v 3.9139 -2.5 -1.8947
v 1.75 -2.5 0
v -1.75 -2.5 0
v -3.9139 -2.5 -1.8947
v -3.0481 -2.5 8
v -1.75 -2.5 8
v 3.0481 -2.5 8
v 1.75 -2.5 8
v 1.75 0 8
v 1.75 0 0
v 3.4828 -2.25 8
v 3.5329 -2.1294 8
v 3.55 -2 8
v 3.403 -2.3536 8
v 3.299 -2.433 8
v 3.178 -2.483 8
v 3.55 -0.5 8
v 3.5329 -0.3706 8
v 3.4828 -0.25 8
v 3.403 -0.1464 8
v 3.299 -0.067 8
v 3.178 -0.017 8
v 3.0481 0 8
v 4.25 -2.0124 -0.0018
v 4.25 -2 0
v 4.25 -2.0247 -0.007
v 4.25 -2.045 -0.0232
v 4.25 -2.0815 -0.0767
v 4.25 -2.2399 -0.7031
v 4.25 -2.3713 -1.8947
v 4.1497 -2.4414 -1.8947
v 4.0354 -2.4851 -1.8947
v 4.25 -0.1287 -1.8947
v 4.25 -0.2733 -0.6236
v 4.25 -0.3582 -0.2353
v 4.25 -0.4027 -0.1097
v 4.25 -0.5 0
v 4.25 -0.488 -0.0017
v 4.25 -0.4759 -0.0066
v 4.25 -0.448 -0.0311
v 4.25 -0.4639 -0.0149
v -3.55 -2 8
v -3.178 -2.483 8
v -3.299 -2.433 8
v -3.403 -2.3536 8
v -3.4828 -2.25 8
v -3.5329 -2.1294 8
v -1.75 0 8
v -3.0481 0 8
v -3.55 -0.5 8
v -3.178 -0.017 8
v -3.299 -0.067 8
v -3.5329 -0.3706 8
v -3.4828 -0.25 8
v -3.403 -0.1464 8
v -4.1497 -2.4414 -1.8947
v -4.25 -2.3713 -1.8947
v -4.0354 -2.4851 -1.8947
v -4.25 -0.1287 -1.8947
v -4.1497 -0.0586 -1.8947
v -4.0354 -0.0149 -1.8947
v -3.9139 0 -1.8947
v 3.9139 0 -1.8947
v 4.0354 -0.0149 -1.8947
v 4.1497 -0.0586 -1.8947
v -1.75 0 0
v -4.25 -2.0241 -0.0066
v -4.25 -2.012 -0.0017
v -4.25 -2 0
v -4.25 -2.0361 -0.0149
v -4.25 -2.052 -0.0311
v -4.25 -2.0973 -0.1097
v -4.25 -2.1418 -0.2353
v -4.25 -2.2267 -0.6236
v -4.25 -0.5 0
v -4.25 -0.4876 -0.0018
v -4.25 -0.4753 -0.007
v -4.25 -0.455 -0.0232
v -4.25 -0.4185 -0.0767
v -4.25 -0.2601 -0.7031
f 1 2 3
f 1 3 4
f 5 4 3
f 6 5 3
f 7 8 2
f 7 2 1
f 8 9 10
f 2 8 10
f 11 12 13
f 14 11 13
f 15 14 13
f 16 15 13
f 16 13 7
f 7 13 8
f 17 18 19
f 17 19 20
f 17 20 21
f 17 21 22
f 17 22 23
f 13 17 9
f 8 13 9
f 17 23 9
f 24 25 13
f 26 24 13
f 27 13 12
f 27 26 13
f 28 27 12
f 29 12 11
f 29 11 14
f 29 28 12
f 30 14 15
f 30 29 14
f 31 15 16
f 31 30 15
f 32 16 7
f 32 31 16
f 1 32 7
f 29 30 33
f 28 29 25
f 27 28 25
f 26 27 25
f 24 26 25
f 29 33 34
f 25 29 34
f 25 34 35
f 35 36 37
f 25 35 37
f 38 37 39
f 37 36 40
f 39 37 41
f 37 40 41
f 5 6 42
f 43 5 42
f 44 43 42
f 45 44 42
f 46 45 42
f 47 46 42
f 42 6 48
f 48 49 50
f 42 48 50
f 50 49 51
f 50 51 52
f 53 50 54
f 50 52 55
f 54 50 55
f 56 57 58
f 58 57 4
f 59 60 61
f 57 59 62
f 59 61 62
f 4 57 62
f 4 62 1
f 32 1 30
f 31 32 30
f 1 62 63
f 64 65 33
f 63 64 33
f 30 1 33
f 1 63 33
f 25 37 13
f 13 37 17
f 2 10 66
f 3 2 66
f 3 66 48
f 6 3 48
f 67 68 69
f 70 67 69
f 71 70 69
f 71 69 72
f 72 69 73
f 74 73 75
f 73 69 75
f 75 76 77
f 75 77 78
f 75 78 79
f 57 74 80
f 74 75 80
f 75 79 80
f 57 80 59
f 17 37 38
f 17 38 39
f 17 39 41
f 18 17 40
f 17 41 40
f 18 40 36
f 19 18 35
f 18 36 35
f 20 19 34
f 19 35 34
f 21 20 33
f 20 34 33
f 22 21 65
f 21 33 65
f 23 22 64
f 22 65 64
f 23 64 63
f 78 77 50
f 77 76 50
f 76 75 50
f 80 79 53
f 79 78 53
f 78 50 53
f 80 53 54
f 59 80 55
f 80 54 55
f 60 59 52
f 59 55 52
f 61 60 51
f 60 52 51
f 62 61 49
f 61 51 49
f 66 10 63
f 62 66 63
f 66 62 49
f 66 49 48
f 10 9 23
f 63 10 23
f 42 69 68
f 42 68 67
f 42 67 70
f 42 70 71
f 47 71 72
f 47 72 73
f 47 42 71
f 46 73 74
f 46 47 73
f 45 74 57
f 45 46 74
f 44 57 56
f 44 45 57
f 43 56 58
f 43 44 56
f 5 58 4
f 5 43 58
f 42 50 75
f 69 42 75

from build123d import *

# Parameters (mm, degrees)
F1_DEPTH    = 2.5
F2_T1_DEPTH = 15.5305666052
F2_T3_DEPTH = 15.5305666052


# Not quite as in the source:
# - a fillet or chamfer that OpenCascade refuses, or shapes differently, is made with other operations: its cross-section is extruded or revolved along the edge and cut away or added


with BuildPart() as f1:
    # F0 (on Front) → F1 (new body)
    with BuildSketch(Plane.XZ):
        Polygon((0, -1.894692351), (0, 0), (-1.75, 0), (-4.25, 0), (-4.25, -1.894692351), align=None)
        Polygon((1.75, 0), (0, 0), (0, -1.894692351), (4.25, -1.894692351), (4.25, 0), align=None)
        Polygon((-4.25, 0), (-1.75, 0), (-1.75, 8), (-3.55, 8), align=None)
        Polygon((1.75, 8), (1.75, 0), (4.25, 0), (3.55, 8), align=None)
    extrude(amount=F1_DEPTH)

    # F2: fillet of radius 0.5 on 4 edges, made by hand

    # F2_s2 → F2_t1 (cut)
    with BuildSketch(Plane(origin=(0.5770852674, 0, -6.5952601994), x_dir=(0, 1, 0), z_dir=(-0.0871669503, 0, 0.9961937175))):
        with BuildLine():
            ThreePointArc((-2, -4.2338232994), (-2.3535533906, -4.08737669), (-2.5, -3.7338232994))
            Line((-2.5, -3.7338232994), (-2.5, -4.2338232994))
            Line((-2.5, -4.2338232994), (-2, -4.2338232994))
        make_face()
        with BuildLine():
            ThreePointArc((-0.5, -4.2338232994), (-0.1464466094, -4.08737669), (0, -3.7338232994))
            Line((0, -3.7338232994), (0, -4.2338232994))
            Line((0, -4.2338232994), (-0.5, -4.2338232994))
        make_face()
    extrude(amount=F2_T1_DEPTH, mode=Mode.SUBTRACT)

    # F2_s4 → F2_t3 (cut)
    with BuildSketch(Plane(origin=(0.7766668597, 0, 8.8761926818), x_dir=(0, 1, 0), z_dir=(-0.0871669503, 0, -0.9961937175))):
        with BuildLine():
            ThreePointArc((-2, -4.2338232994), (-2.3535533906, -4.08737669), (-2.5, -3.7338232994))
            Line((-2.5, -3.7338232994), (-2.5, -4.2338232994))
            Line((-2.5, -4.2338232994), (-2, -4.2338232994))
        make_face()
        with BuildLine():
            ThreePointArc((-0.5, -4.2338232994), (-0.1464466094, -4.08737669), (0, -3.7338232994))
            Line((0, -3.7338232994), (0, -4.2338232994))
            Line((0, -4.2338232994), (-0.5, -4.2338232994))
        make_face()
    extrude(amount=F2_T3_DEPTH, mode=Mode.SUBTRACT)


solid = f1.part
